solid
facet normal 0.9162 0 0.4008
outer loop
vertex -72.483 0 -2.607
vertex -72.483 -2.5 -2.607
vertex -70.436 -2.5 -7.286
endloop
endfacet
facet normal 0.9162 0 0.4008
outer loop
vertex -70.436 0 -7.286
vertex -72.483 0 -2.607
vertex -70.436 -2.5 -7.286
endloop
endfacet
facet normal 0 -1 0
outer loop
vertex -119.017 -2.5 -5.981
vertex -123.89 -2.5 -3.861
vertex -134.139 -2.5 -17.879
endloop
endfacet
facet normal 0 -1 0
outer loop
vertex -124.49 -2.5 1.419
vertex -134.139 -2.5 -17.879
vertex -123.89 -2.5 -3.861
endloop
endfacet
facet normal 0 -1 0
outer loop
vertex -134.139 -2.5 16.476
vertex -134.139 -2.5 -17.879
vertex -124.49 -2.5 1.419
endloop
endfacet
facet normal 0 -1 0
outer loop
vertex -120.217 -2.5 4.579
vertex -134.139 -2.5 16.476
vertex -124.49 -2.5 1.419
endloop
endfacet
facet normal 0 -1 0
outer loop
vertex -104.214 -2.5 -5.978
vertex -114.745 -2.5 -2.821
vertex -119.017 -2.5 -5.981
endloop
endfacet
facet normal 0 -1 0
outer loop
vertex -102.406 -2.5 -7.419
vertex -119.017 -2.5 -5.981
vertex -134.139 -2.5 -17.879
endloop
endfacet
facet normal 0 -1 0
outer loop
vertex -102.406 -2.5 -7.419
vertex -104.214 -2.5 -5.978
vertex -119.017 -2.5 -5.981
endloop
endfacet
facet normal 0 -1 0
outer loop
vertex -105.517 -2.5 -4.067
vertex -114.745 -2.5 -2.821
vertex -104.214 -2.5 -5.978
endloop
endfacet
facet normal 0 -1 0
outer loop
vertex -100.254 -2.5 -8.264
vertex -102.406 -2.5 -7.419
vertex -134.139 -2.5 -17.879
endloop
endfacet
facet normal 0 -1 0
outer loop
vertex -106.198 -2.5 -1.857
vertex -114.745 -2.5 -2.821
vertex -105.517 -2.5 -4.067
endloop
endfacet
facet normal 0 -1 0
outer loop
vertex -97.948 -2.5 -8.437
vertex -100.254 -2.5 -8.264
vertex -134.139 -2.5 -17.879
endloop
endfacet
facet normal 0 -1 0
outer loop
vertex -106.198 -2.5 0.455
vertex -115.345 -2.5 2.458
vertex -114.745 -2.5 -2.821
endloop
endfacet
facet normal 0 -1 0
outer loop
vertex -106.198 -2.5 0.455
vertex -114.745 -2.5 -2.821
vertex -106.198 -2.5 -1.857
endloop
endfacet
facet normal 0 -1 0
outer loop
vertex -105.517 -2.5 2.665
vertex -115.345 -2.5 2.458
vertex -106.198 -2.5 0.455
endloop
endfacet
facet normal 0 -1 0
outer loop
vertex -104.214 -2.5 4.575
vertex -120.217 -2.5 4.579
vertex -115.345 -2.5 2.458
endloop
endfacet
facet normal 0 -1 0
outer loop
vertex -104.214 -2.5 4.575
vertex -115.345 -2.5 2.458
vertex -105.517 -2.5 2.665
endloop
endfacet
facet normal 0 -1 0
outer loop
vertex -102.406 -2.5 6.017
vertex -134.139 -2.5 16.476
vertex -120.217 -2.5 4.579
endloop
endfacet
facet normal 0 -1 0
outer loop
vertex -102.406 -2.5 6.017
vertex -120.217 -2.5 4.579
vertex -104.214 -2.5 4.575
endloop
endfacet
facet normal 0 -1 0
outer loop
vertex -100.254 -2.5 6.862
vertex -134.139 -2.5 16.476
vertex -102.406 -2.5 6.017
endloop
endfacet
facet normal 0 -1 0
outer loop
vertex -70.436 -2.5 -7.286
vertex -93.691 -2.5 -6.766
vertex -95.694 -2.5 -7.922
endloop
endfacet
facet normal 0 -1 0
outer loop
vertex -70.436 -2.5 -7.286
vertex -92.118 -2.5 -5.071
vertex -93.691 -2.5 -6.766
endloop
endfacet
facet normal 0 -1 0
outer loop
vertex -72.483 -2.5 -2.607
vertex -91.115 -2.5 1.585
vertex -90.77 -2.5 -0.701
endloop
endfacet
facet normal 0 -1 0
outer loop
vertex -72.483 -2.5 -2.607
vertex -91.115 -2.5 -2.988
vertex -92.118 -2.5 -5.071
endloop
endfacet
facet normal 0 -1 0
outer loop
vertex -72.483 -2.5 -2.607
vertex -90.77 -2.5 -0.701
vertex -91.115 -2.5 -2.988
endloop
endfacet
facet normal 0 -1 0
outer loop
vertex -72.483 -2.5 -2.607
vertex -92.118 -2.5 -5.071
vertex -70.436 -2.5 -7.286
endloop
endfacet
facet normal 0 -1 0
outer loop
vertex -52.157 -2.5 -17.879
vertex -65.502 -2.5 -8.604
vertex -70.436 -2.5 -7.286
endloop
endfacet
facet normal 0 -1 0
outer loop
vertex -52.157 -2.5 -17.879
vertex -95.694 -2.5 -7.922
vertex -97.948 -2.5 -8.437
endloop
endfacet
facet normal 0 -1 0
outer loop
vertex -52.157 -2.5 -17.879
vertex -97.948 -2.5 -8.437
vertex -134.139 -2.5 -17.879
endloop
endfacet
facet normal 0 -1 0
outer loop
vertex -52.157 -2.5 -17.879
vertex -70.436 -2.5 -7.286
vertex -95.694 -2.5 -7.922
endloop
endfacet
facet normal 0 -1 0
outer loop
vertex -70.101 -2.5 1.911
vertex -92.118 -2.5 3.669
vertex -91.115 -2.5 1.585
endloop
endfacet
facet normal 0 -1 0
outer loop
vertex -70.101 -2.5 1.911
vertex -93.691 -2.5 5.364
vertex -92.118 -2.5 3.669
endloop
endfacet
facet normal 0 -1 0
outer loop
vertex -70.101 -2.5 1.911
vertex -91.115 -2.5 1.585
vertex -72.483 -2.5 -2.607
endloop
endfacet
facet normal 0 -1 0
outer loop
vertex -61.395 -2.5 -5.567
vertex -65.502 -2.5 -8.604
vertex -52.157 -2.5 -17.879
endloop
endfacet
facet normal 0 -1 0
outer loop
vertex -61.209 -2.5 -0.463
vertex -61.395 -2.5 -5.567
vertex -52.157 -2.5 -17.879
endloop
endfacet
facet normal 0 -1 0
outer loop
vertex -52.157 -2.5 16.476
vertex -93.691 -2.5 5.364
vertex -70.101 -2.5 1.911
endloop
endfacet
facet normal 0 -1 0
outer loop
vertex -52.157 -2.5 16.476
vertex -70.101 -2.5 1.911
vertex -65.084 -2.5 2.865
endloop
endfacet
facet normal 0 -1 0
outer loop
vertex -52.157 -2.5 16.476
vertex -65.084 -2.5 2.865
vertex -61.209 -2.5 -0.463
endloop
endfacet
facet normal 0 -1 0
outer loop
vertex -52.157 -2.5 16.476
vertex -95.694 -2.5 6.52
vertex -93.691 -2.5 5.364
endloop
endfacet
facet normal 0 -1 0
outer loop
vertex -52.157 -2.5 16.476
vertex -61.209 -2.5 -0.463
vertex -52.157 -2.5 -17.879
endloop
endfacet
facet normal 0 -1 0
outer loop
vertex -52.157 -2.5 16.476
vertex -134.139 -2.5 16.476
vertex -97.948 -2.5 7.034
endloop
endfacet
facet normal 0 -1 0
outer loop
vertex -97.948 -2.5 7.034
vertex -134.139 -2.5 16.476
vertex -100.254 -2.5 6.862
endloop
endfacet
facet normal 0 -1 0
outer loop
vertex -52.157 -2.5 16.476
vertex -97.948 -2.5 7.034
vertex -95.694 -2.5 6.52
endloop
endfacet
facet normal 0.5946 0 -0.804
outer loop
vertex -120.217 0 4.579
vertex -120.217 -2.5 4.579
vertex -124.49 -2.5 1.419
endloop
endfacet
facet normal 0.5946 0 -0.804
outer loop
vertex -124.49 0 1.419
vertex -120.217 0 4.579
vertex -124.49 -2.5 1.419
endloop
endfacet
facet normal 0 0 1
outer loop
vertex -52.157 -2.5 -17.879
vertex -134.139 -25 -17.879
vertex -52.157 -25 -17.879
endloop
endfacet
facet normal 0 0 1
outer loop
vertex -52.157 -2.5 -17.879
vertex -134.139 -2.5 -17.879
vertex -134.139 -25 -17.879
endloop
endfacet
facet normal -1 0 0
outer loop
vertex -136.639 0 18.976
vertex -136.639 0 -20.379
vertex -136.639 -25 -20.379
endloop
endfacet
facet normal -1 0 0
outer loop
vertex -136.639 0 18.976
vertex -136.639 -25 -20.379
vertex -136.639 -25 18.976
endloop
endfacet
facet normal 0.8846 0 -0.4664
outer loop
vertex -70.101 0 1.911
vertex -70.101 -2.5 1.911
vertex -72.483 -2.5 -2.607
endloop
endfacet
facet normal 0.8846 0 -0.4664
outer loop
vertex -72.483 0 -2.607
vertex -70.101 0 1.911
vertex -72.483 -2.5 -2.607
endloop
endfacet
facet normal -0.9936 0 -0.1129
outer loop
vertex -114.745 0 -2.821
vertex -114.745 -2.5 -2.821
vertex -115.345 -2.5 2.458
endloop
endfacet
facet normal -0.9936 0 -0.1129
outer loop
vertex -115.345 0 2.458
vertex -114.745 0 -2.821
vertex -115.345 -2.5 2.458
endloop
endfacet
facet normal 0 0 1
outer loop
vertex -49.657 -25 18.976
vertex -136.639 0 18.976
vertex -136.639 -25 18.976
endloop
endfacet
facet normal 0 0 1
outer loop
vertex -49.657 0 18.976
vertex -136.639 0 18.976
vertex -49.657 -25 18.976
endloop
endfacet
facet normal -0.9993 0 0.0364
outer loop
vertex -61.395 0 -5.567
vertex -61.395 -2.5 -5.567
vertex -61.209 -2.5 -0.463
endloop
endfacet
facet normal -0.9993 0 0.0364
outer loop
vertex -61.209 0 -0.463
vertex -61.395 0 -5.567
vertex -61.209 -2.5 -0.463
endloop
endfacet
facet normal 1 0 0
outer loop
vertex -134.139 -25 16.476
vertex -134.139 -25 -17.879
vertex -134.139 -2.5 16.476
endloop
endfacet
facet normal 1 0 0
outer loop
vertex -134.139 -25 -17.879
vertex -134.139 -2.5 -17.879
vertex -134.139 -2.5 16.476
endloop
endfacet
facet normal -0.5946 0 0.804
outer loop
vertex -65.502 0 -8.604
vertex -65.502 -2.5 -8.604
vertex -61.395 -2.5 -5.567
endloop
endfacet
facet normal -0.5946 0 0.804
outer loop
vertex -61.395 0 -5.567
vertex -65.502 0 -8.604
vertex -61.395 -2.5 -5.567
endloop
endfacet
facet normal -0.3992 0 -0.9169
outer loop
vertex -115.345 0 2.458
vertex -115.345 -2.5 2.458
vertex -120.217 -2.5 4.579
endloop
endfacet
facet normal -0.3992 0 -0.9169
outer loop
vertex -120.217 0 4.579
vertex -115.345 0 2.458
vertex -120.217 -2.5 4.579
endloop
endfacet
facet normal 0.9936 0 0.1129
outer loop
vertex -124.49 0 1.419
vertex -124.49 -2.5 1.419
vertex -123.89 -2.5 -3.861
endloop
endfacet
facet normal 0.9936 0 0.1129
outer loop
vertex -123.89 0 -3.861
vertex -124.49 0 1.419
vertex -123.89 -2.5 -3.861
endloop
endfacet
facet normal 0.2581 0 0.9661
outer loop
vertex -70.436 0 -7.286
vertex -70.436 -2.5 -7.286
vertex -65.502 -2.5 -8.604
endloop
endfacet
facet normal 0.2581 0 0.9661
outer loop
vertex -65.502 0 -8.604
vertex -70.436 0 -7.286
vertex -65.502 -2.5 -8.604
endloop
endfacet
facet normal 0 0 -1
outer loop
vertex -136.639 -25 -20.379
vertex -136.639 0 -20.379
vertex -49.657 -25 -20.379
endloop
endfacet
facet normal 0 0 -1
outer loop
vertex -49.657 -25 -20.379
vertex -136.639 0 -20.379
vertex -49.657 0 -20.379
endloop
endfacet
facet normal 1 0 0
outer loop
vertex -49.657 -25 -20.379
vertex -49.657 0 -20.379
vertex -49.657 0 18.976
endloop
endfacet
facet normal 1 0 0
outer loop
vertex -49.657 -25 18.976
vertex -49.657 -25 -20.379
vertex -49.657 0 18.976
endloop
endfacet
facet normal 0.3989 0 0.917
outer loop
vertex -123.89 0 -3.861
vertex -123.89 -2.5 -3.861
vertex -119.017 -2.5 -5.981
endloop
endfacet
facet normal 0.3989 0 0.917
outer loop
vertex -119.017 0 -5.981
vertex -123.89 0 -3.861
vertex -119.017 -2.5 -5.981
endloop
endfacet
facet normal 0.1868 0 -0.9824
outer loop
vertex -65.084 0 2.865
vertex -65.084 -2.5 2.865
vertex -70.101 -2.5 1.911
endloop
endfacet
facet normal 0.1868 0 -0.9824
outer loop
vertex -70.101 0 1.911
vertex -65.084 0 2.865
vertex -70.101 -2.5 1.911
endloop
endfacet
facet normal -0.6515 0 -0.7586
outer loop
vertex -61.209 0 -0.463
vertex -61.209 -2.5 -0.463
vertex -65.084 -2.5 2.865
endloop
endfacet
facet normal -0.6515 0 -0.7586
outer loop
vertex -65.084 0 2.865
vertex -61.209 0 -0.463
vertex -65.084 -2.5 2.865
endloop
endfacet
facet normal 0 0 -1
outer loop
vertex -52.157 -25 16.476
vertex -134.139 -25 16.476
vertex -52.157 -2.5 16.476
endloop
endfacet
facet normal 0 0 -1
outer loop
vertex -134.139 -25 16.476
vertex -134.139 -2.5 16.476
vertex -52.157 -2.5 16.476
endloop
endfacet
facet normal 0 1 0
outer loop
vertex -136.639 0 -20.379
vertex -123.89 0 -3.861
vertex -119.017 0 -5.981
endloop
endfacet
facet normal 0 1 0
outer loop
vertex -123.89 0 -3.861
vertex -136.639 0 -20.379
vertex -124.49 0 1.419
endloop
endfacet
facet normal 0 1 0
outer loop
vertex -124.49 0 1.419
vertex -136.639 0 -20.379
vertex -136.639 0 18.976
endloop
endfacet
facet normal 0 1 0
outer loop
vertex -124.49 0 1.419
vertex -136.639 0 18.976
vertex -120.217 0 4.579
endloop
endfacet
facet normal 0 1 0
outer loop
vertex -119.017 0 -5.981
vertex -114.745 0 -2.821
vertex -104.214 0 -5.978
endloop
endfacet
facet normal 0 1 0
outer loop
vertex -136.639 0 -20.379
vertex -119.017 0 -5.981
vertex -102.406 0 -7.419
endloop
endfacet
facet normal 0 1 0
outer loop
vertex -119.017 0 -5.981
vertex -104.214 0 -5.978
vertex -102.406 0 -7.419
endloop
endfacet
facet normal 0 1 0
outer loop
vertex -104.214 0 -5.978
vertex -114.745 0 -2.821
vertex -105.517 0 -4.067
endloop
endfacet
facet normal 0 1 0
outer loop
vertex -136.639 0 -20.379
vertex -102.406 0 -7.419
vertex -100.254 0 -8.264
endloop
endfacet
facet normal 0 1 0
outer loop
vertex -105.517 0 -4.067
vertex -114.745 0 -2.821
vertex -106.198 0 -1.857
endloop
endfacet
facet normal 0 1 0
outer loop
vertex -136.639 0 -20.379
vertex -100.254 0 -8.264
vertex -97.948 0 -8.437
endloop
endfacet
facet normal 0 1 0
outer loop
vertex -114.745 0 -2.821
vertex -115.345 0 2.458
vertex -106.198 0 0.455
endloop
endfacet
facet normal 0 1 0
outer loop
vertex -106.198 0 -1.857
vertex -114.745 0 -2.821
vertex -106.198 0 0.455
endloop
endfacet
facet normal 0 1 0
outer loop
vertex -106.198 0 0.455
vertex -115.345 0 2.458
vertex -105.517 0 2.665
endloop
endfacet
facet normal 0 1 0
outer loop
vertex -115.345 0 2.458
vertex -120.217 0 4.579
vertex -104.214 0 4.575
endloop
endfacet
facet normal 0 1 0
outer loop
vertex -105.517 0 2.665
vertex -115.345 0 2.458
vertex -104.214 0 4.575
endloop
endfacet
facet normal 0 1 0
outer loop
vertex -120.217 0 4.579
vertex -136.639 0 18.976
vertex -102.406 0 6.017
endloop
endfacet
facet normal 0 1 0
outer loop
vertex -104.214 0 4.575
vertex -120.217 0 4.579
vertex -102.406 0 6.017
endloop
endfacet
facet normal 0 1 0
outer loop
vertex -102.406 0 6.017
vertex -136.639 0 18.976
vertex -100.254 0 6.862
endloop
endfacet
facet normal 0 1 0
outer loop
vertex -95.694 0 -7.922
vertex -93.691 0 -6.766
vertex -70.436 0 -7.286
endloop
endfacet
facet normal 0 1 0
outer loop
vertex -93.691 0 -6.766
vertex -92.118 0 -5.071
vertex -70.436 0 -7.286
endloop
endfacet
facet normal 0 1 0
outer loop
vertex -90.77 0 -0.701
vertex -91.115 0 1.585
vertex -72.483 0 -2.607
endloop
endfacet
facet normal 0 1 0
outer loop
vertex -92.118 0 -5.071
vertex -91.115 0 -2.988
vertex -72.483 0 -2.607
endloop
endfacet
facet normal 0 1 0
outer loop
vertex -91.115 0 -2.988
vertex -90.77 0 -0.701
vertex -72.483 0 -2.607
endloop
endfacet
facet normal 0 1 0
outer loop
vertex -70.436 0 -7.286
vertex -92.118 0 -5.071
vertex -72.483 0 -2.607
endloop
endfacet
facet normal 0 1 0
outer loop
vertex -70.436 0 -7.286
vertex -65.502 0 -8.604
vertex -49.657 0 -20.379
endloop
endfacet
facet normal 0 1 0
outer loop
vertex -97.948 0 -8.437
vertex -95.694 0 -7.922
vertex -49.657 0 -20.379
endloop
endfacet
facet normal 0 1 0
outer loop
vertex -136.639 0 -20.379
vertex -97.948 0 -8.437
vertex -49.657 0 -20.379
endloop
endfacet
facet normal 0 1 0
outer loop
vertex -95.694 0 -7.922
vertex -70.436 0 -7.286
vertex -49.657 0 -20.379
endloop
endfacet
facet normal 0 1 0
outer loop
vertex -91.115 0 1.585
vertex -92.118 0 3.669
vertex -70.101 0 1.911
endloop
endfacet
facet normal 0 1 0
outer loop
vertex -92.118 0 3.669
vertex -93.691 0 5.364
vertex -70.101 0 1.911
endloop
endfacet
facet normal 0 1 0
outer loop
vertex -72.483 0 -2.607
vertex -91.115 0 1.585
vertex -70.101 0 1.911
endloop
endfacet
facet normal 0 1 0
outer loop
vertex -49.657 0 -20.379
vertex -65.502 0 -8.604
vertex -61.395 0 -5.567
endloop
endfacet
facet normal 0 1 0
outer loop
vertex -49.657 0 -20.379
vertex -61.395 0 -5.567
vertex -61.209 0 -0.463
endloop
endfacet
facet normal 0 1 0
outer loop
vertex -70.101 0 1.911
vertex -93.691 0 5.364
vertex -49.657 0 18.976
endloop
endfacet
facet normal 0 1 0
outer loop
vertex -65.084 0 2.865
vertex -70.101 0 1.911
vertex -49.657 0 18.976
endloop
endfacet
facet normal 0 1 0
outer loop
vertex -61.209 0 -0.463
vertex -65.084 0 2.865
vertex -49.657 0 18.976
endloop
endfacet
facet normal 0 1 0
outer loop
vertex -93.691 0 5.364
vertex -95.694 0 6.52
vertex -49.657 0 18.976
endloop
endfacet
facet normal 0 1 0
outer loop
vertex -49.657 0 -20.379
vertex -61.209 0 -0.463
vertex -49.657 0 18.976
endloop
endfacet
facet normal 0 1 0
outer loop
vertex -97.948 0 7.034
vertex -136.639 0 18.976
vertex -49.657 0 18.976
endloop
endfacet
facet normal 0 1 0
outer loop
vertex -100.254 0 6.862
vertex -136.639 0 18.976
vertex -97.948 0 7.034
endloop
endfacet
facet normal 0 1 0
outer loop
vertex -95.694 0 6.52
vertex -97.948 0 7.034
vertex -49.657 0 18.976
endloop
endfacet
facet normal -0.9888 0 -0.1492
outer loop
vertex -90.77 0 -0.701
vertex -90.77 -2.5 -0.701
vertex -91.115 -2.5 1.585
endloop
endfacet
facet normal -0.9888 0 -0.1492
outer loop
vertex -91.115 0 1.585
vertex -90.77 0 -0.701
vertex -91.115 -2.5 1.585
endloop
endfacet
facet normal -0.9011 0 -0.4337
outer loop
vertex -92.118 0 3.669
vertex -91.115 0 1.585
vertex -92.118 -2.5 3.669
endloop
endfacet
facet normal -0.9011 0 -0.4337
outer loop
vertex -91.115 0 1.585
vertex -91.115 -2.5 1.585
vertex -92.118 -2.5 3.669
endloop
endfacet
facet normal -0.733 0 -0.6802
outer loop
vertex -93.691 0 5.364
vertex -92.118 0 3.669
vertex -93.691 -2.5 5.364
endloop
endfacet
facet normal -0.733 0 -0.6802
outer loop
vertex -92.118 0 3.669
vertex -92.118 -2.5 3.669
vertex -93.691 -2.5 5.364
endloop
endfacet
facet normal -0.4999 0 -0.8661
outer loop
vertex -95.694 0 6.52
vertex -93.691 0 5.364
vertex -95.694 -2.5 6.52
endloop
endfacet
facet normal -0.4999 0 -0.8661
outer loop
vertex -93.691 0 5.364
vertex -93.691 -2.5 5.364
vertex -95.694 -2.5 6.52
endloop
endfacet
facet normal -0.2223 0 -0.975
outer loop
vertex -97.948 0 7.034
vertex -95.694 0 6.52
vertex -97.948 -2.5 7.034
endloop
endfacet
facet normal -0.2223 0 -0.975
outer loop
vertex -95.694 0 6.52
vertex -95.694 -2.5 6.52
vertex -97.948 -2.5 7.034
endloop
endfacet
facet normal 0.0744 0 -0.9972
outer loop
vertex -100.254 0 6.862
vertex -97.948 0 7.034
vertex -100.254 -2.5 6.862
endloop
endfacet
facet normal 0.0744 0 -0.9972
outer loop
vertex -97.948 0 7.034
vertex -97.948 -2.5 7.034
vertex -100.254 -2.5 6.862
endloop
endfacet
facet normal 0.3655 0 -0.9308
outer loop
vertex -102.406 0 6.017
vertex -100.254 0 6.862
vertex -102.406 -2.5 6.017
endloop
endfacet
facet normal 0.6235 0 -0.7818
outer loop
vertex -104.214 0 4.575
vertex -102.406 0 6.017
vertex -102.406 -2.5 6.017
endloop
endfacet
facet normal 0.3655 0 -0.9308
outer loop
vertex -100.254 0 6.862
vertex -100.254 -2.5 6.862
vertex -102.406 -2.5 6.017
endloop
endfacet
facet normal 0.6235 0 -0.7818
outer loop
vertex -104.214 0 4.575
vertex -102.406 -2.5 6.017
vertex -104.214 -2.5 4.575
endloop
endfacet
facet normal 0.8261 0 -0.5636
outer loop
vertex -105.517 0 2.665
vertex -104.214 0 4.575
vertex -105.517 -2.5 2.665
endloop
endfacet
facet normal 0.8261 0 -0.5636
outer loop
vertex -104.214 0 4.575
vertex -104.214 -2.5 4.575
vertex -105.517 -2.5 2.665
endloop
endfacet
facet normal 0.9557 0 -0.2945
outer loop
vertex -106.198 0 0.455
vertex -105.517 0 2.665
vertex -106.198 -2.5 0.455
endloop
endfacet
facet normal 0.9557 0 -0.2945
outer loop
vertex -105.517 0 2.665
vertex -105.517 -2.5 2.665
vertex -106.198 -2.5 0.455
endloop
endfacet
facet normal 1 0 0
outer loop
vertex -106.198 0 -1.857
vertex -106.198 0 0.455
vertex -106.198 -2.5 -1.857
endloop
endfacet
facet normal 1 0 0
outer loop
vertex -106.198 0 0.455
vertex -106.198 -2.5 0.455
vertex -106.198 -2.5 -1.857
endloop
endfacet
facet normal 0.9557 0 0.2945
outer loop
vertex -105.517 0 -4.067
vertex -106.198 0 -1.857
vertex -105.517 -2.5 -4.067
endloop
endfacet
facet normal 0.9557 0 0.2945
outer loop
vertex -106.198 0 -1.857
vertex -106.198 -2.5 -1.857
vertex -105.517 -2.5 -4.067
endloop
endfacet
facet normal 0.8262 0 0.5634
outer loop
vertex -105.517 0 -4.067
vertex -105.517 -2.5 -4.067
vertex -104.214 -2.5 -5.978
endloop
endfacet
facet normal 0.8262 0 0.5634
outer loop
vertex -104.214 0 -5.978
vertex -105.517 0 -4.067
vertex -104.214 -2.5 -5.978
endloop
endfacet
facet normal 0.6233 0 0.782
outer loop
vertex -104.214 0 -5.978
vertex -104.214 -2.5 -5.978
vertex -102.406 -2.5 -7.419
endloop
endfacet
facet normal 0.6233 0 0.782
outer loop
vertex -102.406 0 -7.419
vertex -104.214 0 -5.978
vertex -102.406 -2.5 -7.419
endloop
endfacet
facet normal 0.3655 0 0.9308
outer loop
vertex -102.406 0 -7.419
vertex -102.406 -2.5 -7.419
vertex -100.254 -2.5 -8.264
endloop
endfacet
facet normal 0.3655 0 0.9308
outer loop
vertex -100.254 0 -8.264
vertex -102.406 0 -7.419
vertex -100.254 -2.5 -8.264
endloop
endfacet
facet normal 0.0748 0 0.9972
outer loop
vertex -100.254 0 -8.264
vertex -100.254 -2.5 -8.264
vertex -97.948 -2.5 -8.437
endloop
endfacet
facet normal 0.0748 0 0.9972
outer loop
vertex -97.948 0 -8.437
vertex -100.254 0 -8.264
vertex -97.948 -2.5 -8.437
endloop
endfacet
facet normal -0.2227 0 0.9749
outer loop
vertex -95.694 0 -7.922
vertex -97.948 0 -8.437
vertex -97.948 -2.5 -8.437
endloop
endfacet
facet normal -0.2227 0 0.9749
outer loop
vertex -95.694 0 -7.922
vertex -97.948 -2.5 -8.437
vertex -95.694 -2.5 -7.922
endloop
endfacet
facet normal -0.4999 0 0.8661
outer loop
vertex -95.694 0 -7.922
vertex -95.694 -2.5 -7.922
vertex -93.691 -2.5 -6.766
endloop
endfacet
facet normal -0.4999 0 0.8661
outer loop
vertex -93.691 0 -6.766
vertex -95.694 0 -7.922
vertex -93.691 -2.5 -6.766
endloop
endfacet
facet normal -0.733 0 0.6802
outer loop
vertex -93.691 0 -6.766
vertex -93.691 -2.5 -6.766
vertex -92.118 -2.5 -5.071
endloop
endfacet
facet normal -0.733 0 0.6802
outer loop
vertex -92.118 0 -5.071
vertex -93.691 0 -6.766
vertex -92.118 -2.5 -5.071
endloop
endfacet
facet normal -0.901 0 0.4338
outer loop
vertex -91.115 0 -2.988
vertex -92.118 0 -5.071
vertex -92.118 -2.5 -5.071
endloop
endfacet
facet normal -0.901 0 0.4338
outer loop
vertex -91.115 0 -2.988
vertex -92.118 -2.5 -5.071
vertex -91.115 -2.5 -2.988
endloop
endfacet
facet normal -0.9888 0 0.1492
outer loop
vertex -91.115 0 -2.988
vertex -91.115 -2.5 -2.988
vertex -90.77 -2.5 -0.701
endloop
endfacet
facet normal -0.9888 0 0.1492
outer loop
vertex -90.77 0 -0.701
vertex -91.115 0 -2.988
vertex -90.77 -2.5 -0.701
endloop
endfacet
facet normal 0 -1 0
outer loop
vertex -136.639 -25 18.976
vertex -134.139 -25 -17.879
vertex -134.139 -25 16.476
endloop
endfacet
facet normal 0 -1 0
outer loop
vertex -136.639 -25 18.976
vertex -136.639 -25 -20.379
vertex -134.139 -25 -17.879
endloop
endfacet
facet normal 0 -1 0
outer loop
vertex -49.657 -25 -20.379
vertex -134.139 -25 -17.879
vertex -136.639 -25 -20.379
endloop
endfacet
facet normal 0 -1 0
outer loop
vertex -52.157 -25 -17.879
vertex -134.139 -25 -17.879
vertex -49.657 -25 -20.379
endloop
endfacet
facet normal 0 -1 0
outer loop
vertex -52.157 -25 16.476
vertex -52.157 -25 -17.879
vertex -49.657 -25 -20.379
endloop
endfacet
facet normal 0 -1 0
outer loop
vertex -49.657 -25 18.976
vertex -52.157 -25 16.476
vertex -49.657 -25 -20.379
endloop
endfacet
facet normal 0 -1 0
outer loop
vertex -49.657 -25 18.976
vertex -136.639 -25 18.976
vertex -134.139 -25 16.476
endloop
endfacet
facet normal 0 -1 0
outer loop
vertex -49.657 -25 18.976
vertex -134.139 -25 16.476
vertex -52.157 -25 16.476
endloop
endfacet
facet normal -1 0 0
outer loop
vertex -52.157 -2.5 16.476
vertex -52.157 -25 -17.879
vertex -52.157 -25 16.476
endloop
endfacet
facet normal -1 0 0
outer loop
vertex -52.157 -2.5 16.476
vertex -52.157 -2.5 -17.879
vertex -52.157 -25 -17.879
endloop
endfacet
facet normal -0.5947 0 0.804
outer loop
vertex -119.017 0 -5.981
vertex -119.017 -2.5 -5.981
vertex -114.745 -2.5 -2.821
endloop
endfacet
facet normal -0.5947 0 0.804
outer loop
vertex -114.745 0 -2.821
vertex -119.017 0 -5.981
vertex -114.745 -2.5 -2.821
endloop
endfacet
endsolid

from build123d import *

# Parameters (mm, degrees)
F0_W     = 86.981553
F0_H     = 39.354872
F1_DEPTH = 25
F2_T     = -2.5
F3_R     = 7.757287
F4_DEPTH = 25
F6_DEPTH = 25


with BuildPart() as f1:
    # F0 (on Front) → F1 (new body)
    with BuildSketch(Plane.XZ):
        with Locations((-93.148147, -0.701256)):
            Rectangle(F0_W, F0_H)
    extrude(amount=F1_DEPTH)

    # F2
    f2_openings = [f1.faces().sort_by_distance(p)[0] for p in [
        (-93.148148, -25, -0.701256),
    ]]
    offset(amount=F2_T, openings=f2_openings)

    # F3 (on face) → F4 (cut)
    with BuildSketch(Plane.XZ.offset(2.5)):
        with Locations((-98.527715, -0.701256)):
            Circle(F3_R)
    extrude(amount=-F4_DEPTH, mode=Mode.SUBTRACT)

    # F5 (on face) → F6 (cut)
    with BuildSketch(Plane.XZ.offset(2.5)):
        Polygon((-119.016969, -5.981139), (-114.744506, -2.821497), (-115.344604, 2.458386), (-120.217166, 4.578626), (-124.489629, 1.418985), (-123.889531, -3.860898), align=None)
        Polygon((-65.501607, -8.603557), (-61.395115, -5.566656), (-61.209103, -0.462595), (-65.083642, 2.865165), (-70.101126, 1.910753), (-72.483286, -2.60714), (-70.436308, -7.286448), align=None)
    extrude(amount=-F6_DEPTH, mode=Mode.SUBTRACT)


solid = f1.part
